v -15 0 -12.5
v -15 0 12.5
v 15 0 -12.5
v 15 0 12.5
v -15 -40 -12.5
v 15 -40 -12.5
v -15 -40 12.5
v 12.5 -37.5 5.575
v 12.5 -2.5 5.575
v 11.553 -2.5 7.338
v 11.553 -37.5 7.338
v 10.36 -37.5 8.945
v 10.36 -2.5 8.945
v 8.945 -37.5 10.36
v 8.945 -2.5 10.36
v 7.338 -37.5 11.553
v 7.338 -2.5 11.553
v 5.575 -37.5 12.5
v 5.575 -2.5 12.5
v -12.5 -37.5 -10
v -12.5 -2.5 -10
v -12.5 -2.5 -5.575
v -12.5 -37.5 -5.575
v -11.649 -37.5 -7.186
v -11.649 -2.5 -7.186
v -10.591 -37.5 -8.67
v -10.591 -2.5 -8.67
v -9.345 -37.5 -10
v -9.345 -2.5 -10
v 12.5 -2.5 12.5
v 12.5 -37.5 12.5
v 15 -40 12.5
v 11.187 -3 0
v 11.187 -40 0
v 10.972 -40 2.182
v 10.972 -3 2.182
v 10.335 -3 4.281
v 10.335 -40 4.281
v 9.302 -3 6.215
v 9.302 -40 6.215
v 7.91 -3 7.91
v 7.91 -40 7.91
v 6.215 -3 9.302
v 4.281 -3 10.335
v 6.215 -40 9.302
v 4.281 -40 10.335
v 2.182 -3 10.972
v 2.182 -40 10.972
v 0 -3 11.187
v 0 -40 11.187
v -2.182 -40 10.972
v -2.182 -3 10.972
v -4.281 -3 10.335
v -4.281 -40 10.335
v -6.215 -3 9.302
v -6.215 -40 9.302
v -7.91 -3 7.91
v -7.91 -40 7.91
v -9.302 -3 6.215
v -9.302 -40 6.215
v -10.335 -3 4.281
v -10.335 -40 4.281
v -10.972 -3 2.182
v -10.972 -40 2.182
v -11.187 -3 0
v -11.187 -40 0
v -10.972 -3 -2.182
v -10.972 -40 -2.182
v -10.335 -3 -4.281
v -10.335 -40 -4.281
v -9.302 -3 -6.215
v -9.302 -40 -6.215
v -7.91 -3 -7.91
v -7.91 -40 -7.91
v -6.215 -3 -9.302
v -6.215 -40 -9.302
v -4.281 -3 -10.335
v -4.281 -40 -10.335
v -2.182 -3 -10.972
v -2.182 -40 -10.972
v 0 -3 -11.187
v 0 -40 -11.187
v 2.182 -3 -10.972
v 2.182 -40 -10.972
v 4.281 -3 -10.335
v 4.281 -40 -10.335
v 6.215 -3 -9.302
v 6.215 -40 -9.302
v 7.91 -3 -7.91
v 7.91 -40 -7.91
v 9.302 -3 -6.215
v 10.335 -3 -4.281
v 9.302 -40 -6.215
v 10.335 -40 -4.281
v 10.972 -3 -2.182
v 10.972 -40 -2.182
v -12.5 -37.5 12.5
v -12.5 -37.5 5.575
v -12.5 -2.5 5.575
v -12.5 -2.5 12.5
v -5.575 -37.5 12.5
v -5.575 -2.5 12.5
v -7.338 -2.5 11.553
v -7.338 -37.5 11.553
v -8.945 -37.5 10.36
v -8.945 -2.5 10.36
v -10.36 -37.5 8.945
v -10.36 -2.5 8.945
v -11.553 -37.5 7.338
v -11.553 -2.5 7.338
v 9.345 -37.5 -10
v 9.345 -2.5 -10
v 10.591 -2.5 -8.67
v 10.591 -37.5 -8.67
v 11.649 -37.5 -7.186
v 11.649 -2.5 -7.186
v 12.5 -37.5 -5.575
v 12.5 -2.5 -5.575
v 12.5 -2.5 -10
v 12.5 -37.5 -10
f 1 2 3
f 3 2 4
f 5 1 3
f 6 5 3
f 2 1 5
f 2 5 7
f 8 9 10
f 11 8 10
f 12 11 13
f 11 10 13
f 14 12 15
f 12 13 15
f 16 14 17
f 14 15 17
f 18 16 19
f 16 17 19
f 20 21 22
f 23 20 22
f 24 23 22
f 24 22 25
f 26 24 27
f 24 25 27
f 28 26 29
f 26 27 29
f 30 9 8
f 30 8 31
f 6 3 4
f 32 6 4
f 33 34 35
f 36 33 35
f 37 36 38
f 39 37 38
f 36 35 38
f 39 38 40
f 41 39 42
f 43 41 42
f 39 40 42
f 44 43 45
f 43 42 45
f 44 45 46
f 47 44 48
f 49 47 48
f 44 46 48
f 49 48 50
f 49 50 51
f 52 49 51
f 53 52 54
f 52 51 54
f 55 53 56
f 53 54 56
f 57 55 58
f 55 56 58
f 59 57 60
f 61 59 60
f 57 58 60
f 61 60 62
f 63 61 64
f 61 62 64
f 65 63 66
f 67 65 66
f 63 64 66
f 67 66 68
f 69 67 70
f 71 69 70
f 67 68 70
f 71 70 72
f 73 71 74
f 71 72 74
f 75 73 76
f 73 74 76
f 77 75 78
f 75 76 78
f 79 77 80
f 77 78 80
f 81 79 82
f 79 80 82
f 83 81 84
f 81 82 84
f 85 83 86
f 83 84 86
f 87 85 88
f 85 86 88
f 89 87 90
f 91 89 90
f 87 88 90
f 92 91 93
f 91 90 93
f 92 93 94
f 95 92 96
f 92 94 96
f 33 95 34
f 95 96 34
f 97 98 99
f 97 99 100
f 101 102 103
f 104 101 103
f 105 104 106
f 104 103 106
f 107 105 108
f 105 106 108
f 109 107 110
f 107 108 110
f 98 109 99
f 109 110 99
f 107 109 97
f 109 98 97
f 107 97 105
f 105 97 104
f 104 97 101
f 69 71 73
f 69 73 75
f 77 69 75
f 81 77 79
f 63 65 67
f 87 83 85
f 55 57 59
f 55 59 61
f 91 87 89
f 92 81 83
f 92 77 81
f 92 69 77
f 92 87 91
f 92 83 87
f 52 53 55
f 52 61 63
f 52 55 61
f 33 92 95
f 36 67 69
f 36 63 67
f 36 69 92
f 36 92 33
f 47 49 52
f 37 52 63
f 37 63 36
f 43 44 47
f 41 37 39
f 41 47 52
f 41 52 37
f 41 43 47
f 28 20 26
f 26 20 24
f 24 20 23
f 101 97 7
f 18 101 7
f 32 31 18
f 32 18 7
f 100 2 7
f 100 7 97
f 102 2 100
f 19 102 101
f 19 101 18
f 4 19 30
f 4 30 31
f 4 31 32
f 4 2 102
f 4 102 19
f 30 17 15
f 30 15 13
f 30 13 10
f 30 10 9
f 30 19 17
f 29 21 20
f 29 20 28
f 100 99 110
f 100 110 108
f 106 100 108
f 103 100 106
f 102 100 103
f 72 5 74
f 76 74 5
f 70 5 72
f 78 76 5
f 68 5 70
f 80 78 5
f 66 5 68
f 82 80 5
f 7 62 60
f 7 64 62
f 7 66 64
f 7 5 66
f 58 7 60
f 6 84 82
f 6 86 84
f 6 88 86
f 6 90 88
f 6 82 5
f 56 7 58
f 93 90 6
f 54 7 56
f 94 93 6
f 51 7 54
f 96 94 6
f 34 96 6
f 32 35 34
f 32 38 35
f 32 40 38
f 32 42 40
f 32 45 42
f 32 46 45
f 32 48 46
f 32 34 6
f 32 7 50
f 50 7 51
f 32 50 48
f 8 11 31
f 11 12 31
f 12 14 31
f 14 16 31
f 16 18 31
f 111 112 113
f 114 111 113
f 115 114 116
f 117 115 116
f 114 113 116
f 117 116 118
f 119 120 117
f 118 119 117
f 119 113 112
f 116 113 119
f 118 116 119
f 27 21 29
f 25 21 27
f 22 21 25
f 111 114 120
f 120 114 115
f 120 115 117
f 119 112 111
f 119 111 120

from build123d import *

# Parameters (mm, degrees)
F0_W     = 30
F0_H     = 25
F1_DEPTH = 40
F2_R     = 11.1868683522
F3_DEPTH = 37
F4_T     = 2.5


# Not quite as in the source:
# - a shell that OpenCascade refuses in one call is made with other operations: the cavity is built on its own and cut out


with BuildPart() as f1:
    # F0 (on Front) → F1 (new body)
    with BuildSketch(Plane.XZ):
        Rectangle(F0_W, F0_H)
    extrude(amount=F1_DEPTH)

    # F2 (on face) → F3 (cut)
    with BuildSketch(Plane.XZ.offset(40)):
        Circle(F2_R)
    extrude(amount=-F3_DEPTH, mode=Mode.SUBTRACT)

    # F4: shell of thickness 2.5, made by hand


with BuildPart() as f4_core1:
    # F4_t2: copy of F1
    add(f1.part)

    # the walls: a layer under each face that stays
    f4_faces = [f4_core1.faces().sort_by_distance(p)[0] for p in [
        (0, -20, -12.5),
        (-15, -20, 0),
        (15, -20, 0),
        (0, 0, 0),
        (-10, -40, -8.3333333333),
        (-11.1868683522, -21.5, 0),
        (0, -3, 0),
    ]]
    thicken(f4_faces, amount=-F4_T, mode=Mode.SUBTRACT)

    # F4_s3 → F4_t4 (revolve, cut)
    with BuildSketch(Plane.XY):
        Polygon((11.1618683522, -3.025), (13.6868683522, -3), (13.6868683522, -0.5), (11.1868683522, -0.5), align=None)
    revolve(axis=Axis((0, -3, 0), (0, -1, 0)), mode=Mode.SUBTRACT)


with BuildPart() as f1_1:
    add(f1.part)

    # what is left inside the walls is the cavity
    f4_cavity = [f4_core1.part.solids().sort_by_distance(p)[0] for p in [
        (-9.695755, -25.833333, 9.695755),
        (9.695755, -25.833333, 9.695755),
        (11.164727, -25.833333, -7.960164),
        (-11.164727, -25.833333, -7.960164),
    ]]
    add(f4_cavity, mode=Mode.SUBTRACT)


solid = f1_1.part
